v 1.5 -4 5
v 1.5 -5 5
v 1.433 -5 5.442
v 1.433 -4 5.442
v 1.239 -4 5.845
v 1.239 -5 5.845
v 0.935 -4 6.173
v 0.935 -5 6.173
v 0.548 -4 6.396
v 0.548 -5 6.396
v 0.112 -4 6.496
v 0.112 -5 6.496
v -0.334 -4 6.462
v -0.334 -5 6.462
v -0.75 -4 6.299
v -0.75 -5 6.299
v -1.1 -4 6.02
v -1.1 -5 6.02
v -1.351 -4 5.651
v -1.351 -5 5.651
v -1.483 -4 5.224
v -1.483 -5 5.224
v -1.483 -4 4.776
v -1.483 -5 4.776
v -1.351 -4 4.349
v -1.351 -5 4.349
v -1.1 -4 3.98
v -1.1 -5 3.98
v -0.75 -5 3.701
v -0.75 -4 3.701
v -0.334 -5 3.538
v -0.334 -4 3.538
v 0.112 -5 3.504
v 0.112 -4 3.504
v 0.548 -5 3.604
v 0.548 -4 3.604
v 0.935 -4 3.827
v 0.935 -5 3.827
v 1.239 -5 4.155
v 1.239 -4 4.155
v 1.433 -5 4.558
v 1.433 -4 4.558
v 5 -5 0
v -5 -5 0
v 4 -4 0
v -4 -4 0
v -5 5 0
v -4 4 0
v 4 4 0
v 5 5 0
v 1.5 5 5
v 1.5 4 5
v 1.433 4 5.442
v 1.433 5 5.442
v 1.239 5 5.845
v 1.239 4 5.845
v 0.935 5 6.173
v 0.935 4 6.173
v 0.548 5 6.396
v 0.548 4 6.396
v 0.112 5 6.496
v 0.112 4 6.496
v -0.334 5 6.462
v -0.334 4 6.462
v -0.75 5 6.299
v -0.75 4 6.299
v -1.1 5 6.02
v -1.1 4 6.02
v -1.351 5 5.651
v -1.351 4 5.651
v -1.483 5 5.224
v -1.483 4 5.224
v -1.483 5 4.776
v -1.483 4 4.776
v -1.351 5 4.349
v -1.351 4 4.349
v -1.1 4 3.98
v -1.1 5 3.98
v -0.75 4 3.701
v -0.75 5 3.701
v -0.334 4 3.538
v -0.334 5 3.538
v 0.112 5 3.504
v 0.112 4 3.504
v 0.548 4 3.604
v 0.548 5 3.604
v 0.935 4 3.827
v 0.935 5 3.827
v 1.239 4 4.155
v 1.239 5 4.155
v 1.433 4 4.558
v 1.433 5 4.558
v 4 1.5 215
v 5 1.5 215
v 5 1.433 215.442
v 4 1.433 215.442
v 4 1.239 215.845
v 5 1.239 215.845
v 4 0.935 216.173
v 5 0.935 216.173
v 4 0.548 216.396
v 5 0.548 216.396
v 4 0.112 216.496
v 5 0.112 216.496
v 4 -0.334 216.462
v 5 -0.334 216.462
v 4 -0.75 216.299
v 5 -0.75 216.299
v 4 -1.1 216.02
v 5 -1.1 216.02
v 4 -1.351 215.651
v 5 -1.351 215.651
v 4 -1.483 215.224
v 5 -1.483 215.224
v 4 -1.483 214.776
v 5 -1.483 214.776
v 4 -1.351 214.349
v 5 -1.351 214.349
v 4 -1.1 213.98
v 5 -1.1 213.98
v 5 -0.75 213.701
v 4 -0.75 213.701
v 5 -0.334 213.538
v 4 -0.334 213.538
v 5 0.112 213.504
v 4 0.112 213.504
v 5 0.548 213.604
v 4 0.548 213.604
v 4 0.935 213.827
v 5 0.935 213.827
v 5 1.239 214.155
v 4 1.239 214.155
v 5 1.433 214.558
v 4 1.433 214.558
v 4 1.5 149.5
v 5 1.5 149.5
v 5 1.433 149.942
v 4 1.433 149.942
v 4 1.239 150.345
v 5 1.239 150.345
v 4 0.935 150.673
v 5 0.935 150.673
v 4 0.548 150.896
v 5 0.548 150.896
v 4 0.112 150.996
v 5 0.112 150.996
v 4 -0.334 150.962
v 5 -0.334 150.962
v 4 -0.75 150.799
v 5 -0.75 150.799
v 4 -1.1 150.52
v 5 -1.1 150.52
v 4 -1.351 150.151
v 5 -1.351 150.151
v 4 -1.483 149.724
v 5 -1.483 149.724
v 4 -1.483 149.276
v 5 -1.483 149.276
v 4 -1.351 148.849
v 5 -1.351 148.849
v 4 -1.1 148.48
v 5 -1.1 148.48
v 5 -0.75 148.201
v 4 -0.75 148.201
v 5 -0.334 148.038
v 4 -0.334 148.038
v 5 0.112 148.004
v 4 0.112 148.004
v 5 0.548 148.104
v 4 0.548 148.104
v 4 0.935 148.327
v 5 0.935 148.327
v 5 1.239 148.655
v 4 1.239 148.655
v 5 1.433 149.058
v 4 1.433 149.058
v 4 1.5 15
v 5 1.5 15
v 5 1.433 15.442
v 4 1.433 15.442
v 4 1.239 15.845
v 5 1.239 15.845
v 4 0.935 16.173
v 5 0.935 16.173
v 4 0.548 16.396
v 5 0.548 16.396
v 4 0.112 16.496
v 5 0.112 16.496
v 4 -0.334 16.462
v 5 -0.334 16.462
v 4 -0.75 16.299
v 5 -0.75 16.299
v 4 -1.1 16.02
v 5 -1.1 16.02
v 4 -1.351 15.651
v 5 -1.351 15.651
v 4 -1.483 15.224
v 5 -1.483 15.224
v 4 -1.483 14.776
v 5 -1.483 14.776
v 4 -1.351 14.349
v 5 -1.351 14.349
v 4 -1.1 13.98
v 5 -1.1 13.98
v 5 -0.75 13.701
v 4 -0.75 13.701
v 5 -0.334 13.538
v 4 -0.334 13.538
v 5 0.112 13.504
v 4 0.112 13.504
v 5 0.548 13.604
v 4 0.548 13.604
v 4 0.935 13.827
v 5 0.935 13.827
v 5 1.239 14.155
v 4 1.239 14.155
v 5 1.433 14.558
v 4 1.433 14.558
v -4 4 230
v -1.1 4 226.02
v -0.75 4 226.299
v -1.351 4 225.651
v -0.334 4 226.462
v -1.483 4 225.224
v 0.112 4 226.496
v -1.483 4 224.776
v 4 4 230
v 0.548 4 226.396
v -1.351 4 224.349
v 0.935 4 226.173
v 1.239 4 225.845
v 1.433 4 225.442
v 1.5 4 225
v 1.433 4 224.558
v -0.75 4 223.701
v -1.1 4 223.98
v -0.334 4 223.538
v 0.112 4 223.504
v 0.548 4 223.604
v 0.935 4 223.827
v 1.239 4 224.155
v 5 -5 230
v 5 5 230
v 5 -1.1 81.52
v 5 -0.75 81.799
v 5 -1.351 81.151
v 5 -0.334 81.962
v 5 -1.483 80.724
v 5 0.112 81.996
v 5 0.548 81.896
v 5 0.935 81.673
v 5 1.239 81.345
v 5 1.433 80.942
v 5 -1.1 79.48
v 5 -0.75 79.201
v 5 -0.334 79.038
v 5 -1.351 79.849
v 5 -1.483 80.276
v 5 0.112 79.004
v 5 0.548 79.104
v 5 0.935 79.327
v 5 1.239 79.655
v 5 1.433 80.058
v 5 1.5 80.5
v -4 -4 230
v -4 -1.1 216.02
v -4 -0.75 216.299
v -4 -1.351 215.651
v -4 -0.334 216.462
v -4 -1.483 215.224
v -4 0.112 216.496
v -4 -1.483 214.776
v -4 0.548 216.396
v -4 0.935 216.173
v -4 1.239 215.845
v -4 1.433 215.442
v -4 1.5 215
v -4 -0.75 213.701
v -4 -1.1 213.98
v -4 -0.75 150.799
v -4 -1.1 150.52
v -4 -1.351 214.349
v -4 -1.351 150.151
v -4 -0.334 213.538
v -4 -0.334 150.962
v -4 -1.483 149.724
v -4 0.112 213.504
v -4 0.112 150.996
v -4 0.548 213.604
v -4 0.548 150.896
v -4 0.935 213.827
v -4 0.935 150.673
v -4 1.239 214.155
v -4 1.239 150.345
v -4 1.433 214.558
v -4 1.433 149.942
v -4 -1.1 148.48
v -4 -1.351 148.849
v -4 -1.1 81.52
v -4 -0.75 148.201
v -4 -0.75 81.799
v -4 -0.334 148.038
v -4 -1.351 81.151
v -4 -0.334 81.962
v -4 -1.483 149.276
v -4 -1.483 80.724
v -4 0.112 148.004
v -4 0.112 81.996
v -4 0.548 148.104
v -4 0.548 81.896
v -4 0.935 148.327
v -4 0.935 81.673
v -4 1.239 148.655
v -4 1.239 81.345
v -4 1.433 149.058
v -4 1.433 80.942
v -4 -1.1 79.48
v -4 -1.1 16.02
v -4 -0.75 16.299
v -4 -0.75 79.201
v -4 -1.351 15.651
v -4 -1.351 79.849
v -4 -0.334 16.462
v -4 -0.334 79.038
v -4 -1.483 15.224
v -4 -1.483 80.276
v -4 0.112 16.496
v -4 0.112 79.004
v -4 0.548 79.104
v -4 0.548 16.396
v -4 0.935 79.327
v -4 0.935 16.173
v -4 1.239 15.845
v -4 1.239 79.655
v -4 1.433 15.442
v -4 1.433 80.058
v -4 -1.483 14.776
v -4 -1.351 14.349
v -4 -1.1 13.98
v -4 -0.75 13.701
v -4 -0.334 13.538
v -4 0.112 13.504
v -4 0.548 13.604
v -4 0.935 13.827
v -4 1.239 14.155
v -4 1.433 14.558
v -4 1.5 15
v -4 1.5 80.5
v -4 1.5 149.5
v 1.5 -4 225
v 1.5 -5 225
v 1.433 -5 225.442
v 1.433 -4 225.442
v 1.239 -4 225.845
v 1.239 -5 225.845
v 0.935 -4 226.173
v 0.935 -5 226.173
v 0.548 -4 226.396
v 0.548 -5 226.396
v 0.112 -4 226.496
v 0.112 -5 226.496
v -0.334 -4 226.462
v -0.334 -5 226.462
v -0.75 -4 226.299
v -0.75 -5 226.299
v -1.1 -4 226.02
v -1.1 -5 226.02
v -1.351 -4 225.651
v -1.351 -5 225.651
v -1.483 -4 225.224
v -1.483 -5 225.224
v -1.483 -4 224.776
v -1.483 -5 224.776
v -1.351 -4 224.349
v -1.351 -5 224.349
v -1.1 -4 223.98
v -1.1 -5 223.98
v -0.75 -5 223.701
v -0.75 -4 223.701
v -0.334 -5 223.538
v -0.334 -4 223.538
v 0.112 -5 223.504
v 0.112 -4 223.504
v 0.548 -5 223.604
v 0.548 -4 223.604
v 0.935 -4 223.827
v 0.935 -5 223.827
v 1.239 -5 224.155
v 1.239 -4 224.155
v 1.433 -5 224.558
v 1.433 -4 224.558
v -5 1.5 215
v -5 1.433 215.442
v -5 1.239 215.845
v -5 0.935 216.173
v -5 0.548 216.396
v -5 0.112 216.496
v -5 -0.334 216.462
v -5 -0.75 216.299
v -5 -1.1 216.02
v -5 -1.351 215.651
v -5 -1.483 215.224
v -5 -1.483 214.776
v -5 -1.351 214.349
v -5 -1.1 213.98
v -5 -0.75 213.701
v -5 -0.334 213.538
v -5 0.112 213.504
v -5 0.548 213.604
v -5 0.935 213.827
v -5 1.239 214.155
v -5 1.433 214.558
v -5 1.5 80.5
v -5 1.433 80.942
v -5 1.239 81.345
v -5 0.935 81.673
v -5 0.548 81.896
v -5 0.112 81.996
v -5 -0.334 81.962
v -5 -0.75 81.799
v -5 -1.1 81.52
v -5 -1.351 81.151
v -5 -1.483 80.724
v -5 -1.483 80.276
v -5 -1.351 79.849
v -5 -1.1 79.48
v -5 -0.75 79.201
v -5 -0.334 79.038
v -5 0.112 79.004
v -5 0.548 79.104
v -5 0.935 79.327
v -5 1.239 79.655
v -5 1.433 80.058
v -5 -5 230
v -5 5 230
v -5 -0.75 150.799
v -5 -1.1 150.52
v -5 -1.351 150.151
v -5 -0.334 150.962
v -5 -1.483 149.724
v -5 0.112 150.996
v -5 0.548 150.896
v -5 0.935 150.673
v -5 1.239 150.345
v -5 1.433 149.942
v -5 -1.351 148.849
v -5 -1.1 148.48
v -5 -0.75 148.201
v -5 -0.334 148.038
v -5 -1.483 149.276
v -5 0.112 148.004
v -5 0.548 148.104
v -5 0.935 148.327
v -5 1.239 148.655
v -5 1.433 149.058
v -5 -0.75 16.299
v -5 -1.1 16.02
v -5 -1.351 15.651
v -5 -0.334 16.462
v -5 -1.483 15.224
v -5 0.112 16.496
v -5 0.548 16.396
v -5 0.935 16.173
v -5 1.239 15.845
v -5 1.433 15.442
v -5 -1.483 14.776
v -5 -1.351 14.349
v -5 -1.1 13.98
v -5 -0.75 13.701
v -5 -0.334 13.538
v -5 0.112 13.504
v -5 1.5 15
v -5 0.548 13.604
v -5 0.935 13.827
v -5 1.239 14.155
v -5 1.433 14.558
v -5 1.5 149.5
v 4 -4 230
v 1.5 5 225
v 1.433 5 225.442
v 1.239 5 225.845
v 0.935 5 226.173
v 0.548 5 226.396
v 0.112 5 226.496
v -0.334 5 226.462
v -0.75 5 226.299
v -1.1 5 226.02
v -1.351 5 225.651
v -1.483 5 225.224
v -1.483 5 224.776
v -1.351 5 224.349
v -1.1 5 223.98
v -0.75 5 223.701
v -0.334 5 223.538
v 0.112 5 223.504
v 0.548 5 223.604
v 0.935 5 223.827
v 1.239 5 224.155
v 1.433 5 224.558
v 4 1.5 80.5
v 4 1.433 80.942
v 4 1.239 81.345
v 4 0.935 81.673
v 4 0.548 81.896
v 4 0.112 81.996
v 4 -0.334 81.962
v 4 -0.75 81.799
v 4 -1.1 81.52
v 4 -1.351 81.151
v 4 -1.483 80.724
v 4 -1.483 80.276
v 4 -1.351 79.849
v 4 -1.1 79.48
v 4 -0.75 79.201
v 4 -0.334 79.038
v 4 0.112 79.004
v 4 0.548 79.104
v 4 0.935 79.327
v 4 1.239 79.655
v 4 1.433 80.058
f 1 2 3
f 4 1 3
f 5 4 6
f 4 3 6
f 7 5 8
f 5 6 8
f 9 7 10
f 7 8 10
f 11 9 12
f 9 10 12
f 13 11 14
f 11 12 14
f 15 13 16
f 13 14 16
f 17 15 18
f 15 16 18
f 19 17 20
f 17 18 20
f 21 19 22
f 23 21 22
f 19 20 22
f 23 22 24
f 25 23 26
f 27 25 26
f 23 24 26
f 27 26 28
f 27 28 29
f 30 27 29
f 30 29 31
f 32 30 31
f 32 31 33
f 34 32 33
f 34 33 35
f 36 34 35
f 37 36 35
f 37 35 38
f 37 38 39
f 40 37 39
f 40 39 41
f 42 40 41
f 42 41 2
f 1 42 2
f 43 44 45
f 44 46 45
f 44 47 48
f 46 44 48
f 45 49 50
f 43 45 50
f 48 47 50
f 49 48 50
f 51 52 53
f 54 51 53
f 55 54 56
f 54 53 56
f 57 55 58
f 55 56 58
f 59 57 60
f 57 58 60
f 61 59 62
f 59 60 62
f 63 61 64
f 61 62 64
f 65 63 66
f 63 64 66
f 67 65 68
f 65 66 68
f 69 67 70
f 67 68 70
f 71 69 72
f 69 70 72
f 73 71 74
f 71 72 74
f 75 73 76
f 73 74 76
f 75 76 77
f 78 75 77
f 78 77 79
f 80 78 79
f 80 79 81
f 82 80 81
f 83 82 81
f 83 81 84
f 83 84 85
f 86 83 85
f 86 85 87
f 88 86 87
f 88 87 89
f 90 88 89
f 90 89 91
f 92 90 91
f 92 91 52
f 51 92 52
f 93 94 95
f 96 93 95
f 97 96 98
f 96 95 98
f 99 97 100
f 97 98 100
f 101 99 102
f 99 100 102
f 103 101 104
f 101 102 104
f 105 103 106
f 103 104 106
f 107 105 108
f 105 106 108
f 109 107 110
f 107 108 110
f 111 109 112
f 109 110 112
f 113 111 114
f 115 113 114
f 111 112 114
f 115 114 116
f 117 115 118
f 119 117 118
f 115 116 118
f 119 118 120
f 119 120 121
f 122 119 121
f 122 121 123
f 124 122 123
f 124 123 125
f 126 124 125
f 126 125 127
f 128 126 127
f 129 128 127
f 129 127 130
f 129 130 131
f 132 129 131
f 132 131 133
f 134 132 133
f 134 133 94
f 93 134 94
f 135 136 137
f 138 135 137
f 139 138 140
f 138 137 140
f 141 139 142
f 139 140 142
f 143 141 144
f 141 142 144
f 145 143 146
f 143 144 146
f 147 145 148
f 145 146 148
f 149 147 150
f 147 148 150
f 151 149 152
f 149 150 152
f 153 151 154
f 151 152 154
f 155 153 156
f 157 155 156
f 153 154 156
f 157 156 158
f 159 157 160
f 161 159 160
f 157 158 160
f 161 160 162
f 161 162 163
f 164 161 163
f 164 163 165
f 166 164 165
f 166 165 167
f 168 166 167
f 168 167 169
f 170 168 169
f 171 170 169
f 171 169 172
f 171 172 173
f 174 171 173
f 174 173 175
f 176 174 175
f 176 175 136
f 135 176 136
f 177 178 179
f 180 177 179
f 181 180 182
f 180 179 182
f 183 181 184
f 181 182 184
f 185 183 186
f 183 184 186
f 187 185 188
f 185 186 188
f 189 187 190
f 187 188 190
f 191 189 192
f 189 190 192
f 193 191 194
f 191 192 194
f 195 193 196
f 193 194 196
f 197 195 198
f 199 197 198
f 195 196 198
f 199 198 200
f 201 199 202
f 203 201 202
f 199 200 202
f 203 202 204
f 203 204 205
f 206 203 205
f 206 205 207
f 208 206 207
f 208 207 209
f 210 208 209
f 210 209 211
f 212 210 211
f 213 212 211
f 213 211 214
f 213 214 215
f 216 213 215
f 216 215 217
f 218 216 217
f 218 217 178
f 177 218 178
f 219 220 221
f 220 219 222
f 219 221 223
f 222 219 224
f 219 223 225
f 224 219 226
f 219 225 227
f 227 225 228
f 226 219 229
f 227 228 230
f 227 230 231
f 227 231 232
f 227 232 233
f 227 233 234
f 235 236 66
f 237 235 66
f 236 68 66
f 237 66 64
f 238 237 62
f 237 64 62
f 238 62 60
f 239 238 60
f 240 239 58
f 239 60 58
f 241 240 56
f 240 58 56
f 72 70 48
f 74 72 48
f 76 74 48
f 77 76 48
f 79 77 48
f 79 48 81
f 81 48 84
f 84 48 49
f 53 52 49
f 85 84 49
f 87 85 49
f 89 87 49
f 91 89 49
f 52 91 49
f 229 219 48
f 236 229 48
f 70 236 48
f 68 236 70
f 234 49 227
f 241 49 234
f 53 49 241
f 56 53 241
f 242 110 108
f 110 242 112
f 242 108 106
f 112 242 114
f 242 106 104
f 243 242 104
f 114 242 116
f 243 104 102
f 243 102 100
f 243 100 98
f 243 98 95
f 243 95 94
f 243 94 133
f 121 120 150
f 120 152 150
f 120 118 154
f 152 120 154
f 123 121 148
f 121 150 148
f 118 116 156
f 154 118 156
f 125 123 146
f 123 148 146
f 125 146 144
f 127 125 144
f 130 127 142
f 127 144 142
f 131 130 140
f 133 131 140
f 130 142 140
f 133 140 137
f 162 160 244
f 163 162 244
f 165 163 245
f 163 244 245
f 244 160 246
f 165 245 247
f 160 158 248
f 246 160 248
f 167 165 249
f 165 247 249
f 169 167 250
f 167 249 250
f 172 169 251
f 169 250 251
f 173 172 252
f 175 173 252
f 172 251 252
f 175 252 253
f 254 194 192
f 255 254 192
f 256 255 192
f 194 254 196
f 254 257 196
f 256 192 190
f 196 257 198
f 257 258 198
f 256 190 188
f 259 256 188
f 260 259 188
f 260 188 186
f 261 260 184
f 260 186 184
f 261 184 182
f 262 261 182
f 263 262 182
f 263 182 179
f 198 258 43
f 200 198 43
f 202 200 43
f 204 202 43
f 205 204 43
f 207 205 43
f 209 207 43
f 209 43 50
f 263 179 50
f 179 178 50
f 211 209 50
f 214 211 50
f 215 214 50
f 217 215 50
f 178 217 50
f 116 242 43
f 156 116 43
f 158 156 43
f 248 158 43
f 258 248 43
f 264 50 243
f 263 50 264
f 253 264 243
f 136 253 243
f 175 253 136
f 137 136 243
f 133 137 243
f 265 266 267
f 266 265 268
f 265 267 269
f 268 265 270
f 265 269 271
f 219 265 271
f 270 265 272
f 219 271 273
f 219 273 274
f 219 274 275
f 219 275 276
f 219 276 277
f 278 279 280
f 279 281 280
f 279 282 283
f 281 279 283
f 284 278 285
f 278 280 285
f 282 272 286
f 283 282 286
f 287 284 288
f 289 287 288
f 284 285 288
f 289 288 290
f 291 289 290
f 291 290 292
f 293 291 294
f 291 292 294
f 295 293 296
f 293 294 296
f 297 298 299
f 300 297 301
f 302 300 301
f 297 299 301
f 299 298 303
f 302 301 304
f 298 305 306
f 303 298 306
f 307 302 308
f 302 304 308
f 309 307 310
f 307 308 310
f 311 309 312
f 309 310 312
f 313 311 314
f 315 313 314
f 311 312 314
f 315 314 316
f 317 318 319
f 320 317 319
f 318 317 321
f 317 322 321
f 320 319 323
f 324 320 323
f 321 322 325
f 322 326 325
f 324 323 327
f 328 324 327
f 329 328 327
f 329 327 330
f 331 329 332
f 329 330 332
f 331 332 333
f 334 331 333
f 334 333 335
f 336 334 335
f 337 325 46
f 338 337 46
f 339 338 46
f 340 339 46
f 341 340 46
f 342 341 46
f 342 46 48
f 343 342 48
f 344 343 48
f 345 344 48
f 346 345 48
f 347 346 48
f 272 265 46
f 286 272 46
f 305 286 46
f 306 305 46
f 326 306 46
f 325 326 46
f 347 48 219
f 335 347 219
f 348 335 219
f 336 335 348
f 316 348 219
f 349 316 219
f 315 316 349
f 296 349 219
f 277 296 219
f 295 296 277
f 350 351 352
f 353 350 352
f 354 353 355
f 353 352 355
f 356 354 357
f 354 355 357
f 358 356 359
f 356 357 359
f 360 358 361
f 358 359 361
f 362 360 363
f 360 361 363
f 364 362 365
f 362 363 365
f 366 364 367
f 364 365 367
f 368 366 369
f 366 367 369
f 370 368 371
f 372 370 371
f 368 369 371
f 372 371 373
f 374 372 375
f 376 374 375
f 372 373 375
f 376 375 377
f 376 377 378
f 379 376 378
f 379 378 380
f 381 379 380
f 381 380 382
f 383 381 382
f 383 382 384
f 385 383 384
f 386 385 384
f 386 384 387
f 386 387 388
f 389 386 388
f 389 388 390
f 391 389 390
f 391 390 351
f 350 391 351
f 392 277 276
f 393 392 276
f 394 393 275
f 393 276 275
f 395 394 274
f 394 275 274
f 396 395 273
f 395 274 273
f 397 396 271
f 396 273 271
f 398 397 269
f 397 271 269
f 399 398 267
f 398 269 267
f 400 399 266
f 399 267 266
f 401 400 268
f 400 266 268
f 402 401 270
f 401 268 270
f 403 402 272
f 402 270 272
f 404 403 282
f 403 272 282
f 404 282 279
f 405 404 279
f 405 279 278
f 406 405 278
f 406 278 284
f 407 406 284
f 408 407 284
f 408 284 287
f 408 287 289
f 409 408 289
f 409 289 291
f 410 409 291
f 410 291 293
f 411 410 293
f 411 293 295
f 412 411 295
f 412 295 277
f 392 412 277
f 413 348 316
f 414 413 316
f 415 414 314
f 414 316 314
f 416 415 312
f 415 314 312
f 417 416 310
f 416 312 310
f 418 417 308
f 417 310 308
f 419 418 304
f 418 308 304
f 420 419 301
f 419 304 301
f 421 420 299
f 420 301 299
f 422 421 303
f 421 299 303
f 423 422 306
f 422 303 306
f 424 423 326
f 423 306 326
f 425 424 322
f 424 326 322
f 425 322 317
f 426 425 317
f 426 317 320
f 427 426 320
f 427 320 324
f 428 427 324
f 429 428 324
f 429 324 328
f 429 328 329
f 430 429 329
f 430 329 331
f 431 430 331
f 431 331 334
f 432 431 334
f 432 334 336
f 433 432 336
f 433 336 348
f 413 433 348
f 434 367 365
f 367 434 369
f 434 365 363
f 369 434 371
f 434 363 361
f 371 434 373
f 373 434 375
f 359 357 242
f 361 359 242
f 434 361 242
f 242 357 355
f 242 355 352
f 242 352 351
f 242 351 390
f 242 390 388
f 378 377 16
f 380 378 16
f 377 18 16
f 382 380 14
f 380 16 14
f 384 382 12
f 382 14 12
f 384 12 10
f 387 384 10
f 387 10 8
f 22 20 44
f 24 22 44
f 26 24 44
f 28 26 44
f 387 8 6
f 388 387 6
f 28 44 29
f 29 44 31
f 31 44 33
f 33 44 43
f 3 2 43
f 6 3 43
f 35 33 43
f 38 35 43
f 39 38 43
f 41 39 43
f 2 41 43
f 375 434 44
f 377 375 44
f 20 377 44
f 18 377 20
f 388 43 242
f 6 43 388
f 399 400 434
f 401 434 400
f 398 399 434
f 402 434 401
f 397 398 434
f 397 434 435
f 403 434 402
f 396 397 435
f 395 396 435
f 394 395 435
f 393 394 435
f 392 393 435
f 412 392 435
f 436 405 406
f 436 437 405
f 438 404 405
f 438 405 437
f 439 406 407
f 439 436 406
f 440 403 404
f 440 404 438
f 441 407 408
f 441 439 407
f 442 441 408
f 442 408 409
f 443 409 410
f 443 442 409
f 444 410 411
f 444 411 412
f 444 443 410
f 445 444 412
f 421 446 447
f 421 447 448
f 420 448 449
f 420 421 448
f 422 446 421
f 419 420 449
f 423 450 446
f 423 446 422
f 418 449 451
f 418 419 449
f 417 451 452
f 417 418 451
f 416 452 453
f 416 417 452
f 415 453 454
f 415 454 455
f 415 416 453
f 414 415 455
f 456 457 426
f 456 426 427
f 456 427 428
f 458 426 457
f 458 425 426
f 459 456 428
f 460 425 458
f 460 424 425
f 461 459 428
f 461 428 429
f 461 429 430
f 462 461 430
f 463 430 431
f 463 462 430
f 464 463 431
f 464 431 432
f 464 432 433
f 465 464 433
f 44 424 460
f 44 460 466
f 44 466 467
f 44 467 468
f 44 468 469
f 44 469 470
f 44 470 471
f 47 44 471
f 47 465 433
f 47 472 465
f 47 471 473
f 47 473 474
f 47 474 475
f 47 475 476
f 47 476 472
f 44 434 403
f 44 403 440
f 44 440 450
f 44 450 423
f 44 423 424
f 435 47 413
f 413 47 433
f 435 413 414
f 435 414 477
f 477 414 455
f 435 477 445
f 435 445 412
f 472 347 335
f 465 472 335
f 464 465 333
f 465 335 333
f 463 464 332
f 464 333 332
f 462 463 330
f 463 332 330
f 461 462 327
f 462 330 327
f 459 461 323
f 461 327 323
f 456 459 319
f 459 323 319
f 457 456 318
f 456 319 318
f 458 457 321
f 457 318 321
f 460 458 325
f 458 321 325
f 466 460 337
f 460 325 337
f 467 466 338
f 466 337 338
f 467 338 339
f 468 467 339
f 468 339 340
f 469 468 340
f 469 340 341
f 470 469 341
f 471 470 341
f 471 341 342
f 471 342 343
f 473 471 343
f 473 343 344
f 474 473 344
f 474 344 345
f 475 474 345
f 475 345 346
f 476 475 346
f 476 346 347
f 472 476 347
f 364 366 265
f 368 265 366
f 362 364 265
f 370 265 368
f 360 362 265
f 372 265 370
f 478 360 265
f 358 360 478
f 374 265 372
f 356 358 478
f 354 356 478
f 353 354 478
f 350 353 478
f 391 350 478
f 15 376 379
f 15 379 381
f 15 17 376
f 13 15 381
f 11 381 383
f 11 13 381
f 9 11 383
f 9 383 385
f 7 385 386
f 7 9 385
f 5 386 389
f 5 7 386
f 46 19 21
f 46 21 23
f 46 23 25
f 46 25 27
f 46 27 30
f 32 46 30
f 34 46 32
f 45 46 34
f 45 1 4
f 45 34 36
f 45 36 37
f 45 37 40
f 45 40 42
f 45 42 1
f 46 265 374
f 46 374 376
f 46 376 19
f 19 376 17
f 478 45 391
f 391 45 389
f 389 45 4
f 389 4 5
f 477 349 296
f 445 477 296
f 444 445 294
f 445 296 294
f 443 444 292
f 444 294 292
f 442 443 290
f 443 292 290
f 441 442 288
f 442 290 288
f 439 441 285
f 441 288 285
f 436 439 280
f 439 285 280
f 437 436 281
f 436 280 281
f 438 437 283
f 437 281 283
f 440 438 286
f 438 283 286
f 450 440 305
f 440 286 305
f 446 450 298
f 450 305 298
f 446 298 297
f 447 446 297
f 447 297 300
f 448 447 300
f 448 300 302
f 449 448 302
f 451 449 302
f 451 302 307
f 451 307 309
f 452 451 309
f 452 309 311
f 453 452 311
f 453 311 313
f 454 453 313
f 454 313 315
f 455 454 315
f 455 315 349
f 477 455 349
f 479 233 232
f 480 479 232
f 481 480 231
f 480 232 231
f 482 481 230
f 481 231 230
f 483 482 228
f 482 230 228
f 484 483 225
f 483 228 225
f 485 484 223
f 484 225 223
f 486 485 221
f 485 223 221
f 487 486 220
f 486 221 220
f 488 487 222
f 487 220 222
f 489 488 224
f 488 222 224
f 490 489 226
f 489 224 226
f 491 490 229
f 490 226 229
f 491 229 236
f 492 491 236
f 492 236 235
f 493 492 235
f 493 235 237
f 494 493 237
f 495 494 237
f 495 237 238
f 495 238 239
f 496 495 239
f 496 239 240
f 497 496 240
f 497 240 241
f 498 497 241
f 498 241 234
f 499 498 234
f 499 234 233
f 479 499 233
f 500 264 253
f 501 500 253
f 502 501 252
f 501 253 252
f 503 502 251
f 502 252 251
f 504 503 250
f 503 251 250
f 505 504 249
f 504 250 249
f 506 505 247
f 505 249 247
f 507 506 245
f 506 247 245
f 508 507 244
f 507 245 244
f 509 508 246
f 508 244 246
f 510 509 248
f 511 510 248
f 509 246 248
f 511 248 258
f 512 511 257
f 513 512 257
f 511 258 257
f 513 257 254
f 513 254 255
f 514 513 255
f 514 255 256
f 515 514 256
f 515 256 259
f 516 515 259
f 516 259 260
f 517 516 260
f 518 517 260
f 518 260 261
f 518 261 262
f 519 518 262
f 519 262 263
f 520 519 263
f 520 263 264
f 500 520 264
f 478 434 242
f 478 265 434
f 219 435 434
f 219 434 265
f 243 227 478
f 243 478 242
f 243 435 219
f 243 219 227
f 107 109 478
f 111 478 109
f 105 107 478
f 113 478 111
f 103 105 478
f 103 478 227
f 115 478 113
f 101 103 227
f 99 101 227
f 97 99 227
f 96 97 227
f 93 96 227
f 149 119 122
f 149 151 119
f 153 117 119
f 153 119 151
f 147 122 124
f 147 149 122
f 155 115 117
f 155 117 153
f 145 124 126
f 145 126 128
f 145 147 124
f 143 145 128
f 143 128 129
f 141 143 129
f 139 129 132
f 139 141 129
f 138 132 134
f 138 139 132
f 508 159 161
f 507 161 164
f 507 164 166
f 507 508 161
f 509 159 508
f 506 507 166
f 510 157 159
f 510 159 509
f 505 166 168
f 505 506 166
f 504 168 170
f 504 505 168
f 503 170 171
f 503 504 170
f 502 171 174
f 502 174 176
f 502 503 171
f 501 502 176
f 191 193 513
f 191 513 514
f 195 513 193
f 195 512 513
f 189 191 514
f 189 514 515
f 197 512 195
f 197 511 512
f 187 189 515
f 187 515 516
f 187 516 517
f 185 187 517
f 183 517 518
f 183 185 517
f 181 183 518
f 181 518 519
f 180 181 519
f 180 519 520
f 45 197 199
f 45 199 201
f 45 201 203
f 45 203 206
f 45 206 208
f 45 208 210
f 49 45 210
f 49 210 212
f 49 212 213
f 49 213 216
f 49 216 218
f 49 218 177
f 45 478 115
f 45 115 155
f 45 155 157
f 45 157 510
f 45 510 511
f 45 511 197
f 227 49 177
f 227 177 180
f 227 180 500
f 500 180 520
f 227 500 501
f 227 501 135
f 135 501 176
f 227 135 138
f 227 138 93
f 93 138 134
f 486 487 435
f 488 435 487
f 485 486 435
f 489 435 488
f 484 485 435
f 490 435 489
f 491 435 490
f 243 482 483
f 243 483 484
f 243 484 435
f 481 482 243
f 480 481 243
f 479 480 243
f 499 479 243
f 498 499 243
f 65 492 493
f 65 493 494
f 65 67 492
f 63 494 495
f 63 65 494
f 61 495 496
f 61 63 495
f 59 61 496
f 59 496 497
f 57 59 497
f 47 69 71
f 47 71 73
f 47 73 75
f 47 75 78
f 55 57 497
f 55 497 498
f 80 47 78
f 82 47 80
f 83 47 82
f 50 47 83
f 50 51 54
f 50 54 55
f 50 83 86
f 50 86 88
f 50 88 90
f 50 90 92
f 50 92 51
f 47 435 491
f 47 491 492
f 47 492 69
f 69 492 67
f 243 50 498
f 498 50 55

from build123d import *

# Parameters (mm, degrees)
F0_W     = 10
F0_H     = 10
F0_W_2   = 8
F0_H_2   = 8
F1_DEPTH = 230
F2_R     = 1.5
F3_DEPTH = 25
F4_R     = 1.5
F5_DEPTH = 25


with BuildPart() as f1:
    # F0 (on Top) → F1 (new body)
    with BuildSketch(Plane.XY):
        Rectangle(F0_W, F0_H)
        Rectangle(F0_W_2, F0_H_2, mode=Mode.SUBTRACT)
    extrude(amount=F1_DEPTH)

    # F2 (on face) → F3 (cut)
    with BuildSketch(Plane.YZ.offset(5)):
        with Locations((0, 80.5)):
            Circle(F2_R)
        with Locations((0, 15)):
            Circle(F2_R)
        with Locations((0, 149.5)):
            Circle(F2_R)
        with Locations((0, 215)):
            Circle(F2_R)
    extrude(amount=-F3_DEPTH, mode=Mode.SUBTRACT)

    # F4 (on face) → F5 (cut)
    with BuildSketch(Plane.XZ.offset(5)):
        with Locations((0, 5)):
            Circle(F4_R)
        with Locations((0, 225)):
            Circle(F4_R)
    extrude(amount=-F5_DEPTH, mode=Mode.SUBTRACT)


solid = f1.part
